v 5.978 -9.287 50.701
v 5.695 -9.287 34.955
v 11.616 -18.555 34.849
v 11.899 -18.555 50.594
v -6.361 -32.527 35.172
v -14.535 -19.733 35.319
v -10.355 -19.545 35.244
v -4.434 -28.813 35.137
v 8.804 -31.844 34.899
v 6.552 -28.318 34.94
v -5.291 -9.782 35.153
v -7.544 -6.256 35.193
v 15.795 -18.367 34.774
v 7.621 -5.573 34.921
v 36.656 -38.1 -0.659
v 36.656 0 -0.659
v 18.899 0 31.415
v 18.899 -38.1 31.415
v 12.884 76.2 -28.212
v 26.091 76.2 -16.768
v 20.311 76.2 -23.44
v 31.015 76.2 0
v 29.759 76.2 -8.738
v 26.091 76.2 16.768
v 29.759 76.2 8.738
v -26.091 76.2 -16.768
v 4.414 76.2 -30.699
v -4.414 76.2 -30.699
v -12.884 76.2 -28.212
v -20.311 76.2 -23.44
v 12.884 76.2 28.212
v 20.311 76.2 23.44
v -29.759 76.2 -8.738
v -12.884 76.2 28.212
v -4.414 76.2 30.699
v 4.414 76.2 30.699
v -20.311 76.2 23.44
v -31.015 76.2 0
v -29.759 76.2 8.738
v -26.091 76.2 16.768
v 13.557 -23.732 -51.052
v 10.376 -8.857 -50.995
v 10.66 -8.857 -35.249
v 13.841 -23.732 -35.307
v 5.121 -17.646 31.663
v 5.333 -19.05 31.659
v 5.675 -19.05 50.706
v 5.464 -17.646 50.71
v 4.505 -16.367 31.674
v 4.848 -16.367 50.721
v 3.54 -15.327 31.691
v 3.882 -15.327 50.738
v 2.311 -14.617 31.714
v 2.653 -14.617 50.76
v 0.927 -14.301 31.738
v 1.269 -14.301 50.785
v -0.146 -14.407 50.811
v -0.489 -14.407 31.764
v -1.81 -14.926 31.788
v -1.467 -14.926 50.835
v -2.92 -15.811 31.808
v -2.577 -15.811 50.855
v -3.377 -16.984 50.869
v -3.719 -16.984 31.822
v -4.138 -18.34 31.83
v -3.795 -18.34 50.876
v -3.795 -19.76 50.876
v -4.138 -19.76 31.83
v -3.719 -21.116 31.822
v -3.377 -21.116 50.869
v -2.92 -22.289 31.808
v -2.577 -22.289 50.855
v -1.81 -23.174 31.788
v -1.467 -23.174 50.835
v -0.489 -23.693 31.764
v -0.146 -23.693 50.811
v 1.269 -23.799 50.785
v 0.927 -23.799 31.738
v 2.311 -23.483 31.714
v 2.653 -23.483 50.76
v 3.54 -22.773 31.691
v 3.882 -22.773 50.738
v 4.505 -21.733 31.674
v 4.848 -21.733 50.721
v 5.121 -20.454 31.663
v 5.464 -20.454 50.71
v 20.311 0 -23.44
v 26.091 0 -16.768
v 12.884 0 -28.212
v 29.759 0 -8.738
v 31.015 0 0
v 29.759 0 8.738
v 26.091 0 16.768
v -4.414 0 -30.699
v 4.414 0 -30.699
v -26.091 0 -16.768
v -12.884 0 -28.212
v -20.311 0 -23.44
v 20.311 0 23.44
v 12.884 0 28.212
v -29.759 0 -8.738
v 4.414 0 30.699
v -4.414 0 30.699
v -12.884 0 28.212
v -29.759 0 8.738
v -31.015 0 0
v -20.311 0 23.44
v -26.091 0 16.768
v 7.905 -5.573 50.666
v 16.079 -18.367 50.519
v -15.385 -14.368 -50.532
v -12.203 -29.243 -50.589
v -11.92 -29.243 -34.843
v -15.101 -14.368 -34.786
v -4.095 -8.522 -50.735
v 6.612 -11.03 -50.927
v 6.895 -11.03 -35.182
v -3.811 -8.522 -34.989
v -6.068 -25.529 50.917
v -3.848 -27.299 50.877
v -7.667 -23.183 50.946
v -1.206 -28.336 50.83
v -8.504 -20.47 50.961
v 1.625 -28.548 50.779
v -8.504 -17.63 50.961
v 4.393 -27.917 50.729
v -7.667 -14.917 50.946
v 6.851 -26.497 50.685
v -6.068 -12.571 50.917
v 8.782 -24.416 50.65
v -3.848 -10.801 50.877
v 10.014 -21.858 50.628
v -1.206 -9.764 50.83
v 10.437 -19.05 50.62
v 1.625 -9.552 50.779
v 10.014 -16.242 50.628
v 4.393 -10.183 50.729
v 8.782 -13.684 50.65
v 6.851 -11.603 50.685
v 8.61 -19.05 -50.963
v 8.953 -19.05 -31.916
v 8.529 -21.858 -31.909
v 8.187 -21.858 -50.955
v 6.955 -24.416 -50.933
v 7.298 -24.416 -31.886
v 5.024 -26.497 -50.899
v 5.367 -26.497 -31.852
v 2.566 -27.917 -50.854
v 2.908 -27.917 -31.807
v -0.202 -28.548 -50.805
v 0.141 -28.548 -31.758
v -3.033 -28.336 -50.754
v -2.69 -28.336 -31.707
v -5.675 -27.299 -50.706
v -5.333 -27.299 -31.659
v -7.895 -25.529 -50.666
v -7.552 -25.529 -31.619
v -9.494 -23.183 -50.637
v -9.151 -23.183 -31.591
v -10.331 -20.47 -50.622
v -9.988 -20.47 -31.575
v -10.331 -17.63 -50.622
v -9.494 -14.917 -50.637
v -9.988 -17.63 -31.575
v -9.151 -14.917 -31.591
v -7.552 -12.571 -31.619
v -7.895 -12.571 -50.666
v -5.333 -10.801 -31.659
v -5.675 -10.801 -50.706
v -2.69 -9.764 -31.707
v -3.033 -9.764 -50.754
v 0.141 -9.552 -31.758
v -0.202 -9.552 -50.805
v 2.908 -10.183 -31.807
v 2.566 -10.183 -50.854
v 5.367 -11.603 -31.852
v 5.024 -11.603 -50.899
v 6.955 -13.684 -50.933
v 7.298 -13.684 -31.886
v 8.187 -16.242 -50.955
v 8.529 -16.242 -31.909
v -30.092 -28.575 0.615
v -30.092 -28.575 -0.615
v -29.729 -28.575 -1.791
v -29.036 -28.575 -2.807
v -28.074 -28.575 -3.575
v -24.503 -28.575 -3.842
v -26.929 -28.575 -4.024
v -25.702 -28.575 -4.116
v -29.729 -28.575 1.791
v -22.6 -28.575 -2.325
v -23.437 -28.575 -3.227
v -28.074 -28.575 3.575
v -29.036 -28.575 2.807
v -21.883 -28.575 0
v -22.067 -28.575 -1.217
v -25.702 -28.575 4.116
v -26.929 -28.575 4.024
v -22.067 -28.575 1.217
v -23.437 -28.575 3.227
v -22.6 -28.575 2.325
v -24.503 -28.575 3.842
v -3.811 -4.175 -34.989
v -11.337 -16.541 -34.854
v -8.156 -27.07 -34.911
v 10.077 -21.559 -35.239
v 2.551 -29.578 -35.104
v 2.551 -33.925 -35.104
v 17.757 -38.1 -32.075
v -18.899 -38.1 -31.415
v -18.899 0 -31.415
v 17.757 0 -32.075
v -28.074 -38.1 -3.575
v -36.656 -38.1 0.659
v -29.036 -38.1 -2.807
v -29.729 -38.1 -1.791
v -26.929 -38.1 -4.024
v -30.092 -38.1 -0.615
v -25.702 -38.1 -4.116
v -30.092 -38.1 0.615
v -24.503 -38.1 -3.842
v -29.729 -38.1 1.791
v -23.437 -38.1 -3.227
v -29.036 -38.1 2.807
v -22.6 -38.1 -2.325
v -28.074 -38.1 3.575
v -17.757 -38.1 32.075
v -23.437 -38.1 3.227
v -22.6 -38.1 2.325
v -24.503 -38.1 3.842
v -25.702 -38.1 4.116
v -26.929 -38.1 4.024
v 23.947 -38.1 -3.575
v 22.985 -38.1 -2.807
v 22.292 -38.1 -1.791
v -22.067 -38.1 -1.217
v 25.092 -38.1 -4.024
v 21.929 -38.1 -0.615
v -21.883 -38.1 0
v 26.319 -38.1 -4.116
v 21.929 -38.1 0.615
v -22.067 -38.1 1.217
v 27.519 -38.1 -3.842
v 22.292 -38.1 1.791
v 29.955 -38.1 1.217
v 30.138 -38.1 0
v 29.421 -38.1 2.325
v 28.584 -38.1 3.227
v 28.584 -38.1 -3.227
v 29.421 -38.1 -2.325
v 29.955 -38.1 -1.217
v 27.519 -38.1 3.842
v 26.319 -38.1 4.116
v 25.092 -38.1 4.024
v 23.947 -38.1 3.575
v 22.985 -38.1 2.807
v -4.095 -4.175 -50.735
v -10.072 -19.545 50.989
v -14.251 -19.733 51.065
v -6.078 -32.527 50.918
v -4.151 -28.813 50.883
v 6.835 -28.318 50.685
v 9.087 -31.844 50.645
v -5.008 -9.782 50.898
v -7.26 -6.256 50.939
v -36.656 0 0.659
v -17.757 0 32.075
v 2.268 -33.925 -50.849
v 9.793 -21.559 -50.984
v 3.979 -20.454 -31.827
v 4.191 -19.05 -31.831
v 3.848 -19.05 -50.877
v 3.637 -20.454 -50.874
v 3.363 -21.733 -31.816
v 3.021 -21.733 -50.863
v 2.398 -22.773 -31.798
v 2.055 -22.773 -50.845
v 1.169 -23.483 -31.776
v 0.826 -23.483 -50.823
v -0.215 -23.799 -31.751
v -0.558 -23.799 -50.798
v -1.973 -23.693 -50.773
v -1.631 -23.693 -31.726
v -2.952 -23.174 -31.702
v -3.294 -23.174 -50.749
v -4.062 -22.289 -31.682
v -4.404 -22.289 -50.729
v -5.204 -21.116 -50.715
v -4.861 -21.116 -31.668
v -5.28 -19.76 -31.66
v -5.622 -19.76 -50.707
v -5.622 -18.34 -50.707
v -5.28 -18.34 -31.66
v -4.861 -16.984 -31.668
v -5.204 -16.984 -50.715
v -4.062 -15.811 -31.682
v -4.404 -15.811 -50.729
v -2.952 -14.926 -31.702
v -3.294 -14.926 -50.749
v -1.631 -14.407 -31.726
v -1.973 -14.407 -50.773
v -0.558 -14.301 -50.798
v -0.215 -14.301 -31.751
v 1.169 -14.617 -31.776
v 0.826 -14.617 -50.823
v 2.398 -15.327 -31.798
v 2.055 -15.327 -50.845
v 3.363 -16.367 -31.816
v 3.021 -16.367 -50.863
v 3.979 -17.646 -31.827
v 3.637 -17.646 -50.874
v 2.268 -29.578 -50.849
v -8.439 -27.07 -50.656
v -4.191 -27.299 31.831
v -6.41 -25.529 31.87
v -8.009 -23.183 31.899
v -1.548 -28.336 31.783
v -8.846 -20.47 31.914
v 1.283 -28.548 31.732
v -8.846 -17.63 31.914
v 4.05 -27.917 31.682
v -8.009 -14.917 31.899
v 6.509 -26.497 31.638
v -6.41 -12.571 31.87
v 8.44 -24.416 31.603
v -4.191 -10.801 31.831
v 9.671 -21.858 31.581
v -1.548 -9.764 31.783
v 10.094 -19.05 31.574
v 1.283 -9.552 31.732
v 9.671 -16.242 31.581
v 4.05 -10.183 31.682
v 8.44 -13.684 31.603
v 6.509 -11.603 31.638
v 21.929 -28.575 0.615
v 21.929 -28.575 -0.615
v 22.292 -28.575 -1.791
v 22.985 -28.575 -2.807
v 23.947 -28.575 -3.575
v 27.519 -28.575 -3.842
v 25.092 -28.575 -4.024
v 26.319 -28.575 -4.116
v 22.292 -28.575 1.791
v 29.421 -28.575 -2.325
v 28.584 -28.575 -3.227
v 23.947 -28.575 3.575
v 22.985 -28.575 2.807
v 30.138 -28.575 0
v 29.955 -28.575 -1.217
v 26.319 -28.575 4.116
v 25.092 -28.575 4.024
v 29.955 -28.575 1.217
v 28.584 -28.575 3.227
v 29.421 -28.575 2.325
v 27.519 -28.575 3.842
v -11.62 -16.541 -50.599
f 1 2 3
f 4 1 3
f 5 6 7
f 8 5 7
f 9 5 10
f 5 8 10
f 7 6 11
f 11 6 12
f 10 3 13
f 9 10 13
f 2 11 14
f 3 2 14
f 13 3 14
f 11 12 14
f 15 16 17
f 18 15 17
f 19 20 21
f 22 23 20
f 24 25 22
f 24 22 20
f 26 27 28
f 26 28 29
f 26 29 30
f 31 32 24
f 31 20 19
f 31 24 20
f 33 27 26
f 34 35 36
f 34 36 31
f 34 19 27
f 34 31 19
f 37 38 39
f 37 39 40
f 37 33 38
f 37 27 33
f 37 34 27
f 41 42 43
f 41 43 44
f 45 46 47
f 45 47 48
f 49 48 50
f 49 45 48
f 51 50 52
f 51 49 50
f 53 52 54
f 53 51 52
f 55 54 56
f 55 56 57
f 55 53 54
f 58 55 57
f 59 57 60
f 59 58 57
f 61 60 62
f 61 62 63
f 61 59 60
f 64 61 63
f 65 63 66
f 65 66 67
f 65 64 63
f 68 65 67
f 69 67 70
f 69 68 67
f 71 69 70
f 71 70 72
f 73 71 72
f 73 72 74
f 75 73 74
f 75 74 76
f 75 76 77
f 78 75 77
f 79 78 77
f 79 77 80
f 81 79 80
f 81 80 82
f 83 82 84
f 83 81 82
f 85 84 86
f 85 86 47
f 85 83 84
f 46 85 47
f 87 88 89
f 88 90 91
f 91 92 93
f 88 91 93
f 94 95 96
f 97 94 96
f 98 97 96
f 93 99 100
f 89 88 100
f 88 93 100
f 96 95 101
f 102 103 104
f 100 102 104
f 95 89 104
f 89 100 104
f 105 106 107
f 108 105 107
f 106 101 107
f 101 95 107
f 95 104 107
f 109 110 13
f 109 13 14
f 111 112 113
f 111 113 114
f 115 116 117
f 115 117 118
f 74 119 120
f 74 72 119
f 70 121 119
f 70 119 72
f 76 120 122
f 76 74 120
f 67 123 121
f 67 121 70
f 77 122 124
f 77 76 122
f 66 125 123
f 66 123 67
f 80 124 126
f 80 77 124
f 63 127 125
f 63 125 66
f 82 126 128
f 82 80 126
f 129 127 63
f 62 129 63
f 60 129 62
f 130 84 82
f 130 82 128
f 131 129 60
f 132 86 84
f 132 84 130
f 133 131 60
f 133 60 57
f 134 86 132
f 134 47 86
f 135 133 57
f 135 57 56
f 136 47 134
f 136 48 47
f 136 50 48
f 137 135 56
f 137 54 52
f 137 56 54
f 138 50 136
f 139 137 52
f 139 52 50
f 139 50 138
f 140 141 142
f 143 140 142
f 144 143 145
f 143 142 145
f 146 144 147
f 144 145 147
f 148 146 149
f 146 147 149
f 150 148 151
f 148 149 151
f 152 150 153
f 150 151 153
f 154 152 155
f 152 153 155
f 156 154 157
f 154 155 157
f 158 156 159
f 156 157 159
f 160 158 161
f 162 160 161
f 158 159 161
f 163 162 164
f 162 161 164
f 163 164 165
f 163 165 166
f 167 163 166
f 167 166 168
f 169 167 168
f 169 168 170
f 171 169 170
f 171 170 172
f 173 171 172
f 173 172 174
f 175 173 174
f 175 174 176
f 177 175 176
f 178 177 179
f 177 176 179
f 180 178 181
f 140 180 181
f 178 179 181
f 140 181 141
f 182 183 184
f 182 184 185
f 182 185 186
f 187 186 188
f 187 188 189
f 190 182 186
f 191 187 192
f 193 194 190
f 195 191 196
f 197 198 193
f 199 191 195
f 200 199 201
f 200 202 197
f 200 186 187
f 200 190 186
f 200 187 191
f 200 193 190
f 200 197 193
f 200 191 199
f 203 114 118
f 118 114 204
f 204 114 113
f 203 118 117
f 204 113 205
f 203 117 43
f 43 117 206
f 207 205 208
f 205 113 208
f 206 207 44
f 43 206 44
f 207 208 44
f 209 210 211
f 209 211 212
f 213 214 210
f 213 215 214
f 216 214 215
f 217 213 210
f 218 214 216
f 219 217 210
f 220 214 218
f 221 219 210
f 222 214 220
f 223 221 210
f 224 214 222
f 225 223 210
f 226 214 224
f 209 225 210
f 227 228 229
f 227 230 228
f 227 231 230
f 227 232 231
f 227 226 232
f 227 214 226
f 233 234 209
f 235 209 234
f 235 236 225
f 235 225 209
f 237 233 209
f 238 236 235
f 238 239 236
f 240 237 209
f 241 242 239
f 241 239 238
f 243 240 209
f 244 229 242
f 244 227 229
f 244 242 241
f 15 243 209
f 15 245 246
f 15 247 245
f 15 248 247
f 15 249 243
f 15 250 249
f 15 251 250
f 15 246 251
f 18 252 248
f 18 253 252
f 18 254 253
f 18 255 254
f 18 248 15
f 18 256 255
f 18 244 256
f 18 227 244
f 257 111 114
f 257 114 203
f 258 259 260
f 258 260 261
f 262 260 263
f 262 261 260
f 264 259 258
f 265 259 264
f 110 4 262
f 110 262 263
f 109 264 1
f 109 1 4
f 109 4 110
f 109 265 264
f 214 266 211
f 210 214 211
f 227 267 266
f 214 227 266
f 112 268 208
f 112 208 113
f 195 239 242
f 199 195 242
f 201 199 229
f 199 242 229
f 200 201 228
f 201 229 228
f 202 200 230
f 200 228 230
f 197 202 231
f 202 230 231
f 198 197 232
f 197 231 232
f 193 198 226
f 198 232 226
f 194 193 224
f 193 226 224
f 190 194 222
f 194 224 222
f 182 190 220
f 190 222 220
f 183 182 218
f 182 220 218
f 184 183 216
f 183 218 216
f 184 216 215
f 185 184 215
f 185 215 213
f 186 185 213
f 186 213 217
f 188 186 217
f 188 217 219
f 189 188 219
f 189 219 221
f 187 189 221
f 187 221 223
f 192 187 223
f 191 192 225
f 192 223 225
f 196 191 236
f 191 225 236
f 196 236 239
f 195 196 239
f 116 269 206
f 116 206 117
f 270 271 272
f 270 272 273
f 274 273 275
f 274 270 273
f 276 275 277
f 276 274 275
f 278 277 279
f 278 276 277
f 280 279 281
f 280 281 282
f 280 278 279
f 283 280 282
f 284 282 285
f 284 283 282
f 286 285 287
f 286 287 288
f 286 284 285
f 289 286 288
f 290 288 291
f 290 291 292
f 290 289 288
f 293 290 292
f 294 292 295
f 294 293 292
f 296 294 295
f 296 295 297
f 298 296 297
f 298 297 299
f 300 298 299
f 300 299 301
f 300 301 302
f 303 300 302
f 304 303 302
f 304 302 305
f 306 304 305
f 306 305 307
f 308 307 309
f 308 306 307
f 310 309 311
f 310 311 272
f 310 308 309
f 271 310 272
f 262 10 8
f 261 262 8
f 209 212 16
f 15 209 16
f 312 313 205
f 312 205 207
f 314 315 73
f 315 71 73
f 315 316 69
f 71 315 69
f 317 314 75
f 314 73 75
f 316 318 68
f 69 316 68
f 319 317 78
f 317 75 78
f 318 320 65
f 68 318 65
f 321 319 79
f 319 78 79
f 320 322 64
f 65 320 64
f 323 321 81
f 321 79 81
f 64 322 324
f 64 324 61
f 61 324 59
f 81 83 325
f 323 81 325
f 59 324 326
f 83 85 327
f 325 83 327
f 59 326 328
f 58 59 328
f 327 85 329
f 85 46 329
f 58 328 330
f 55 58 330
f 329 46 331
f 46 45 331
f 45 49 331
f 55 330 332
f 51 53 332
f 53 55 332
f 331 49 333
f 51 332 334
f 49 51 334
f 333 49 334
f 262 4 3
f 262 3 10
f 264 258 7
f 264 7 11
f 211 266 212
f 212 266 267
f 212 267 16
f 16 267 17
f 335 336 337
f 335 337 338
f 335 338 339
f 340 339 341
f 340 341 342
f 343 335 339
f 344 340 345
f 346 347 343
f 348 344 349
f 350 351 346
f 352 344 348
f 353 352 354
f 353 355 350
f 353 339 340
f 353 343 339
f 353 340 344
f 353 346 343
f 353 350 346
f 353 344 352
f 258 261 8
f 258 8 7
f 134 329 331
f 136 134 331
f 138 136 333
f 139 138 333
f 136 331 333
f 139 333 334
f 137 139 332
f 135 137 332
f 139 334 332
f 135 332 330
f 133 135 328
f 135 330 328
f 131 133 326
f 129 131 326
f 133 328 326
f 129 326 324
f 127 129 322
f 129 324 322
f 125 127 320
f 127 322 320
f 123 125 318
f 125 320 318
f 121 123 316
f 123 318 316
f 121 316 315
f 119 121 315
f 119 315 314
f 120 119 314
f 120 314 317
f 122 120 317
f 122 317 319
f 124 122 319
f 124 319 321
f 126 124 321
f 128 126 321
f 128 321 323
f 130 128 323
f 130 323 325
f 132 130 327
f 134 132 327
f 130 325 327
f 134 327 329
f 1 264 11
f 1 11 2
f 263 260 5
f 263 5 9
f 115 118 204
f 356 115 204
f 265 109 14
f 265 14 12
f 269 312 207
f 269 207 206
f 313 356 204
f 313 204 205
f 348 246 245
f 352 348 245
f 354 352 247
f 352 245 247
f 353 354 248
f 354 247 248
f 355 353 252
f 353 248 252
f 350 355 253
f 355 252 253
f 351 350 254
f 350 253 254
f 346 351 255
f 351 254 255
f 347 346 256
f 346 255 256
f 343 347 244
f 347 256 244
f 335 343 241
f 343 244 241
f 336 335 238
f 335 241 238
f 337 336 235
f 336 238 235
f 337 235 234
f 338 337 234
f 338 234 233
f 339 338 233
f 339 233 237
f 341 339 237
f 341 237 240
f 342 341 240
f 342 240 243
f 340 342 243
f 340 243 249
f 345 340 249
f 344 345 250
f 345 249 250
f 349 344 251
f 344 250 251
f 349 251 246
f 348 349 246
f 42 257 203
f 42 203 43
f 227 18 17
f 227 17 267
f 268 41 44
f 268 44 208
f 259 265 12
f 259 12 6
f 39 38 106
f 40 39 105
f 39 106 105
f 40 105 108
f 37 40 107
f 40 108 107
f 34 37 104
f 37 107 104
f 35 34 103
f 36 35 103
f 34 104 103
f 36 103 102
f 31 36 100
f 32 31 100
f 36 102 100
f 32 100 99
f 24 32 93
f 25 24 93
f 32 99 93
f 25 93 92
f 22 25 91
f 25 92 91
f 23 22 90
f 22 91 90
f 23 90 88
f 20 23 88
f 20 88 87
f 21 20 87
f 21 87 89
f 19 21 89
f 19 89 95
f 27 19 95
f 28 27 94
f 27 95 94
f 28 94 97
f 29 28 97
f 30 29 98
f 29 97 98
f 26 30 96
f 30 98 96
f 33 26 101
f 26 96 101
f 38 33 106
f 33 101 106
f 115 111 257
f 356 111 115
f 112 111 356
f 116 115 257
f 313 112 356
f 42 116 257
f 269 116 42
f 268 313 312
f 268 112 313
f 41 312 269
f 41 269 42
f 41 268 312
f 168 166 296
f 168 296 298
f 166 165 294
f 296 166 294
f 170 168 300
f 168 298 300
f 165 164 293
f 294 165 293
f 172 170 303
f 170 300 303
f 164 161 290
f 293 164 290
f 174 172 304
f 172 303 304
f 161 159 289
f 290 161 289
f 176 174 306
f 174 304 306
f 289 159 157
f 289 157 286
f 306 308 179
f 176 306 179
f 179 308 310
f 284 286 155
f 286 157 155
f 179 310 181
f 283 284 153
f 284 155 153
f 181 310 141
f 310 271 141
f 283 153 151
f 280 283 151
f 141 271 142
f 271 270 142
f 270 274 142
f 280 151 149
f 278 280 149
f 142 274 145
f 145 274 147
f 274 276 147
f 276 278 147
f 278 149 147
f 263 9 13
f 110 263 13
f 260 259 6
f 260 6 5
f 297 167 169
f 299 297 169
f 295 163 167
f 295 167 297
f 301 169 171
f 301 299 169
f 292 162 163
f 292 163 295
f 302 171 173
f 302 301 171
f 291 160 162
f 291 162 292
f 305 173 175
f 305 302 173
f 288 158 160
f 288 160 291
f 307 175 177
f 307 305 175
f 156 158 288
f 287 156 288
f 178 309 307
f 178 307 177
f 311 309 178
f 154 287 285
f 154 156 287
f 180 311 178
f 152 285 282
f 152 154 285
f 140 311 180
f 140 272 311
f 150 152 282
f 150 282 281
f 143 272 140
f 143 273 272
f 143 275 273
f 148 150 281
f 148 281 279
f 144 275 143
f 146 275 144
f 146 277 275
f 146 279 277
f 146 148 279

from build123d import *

# Parameters (mm, degrees)
F1_DEPTH  = 38.1
F2_R      = 9.525
F2_R_2    = 4.7625
F3_DEPTH  = 19.05
F5_DEPTH  = 15.748
F6_R      = 9.525
F6_R_2    = 4.7625
F7_DEPTH  = 19.05
F9_DEPTH  = 15.748
F10_R     = 31.015007
F11_DEPTH = 76.2
F12_R     = 4.1275
F13_DEPTH = 9.525


with BuildPart() as f1:
    # F0 (on Front) → F1 (new body)
    with BuildSketch(Plane.XZ):
        Polygon((17.756948, -32.074509), (36.655814, -0.659287), (18.898866, 31.415223), (-17.756948, 32.074509), (-36.655814, 0.659287), (-18.898866, -31.415223), align=None)
    extrude(amount=F1_DEPTH)

    # F12 (on face) → F13 (cut)
    with BuildSketch(Plane.XZ.offset(38.1)):
        with Locations((-26.010668, 0)):
            Circle(F12_R)
        with Locations((26.010668, 0)):
            Circle(F12_R)
    extrude(amount=-F13_DEPTH, mode=Mode.SUBTRACT)


with BuildPart() as f3:
    # F2 (on face) → F3 (new body)
    with BuildSketch(Plane(origin=(-0.570959, 0, -31.744866), x_dir=(0.999838, 0, -0.017983), z_dir=(-0.017983, 0, -0.999838))):
        with Locations((0, 19.05)):
            Circle(F2_R)
        with Locations((0, 19.05)):
            Circle(F2_R_2, mode=Mode.SUBTRACT)
    extrude(amount=F3_DEPTH)


with BuildPart() as f5:
    # F4 (on face) → F5 (new body)
    with BuildSketch(Plane(origin=(-0.913534, 0, -50.791785), x_dir=(0.999838, 0, -0.017983), z_dir=(-0.017983, 0, -0.999838))):
        Polygon((11.291685, 8.856905), (14.473322, 23.732339), (3.181636, 33.925434), (-11.291685, 29.243095), (-14.473322, 14.367661), (-3.181636, 4.174566), align=None)
        Polygon((3.181636, 29.57828), (10.708577, 21.558762), (7.52694, 11.030482), (-3.181636, 8.52172), (-10.708577, 16.541238), (-7.52694, 27.069518), align=None, mode=Mode.SUBTRACT)
    extrude(amount=-F5_DEPTH)


with BuildPart() as f7:
    # F6 (on face) → F7 (new body)
    with BuildSketch(Plane(origin=(0.570959, 0, 31.744866), x_dir=(0.999838, 0, -0.017983), z_dir=(0.017983, 0, 0.999838))):
        with Locations((0, -19.05)):
            Circle(F6_R)
        with Locations((0, -19.05)):
            Circle(F6_R_2, mode=Mode.SUBTRACT)
    extrude(amount=F7_DEPTH)


with BuildPart() as f9:
    # F8 (on face) → F9 (new body)
    with BuildSketch(Plane(origin=(0.913534, 0, 50.791785), x_dir=(0.999838, 0, -0.017983), z_dir=(0.017983, 0, 0.999838))):
        Polygon((8.175178, -31.843901), (15.167432, -18.367039), (6.992254, -5.573138), (-8.175178, -6.256099), (-15.167432, -19.732961), (-6.992254, -32.526862), align=None)
        Polygon((5.065236, -9.287271), (10.98739, -18.555258), (5.922154, -28.317988), (-5.065236, -28.812729), (-10.98739, -19.544742), (-5.922154, -9.782012), align=None, mode=Mode.SUBTRACT)
    extrude(amount=-F9_DEPTH)


with BuildPart() as f11:
    # F10 (on face) → F11 (new body)
    with BuildSketch(Plane(origin=(0, 0, 0), x_dir=(-1, 0, 0), z_dir=(0, 1, 0))):
        Circle(F10_R)
    extrude(amount=F11_DEPTH)


solid = Compound([f1.part, f3.part, f5.part, f7.part, f9.part, f11.part])
